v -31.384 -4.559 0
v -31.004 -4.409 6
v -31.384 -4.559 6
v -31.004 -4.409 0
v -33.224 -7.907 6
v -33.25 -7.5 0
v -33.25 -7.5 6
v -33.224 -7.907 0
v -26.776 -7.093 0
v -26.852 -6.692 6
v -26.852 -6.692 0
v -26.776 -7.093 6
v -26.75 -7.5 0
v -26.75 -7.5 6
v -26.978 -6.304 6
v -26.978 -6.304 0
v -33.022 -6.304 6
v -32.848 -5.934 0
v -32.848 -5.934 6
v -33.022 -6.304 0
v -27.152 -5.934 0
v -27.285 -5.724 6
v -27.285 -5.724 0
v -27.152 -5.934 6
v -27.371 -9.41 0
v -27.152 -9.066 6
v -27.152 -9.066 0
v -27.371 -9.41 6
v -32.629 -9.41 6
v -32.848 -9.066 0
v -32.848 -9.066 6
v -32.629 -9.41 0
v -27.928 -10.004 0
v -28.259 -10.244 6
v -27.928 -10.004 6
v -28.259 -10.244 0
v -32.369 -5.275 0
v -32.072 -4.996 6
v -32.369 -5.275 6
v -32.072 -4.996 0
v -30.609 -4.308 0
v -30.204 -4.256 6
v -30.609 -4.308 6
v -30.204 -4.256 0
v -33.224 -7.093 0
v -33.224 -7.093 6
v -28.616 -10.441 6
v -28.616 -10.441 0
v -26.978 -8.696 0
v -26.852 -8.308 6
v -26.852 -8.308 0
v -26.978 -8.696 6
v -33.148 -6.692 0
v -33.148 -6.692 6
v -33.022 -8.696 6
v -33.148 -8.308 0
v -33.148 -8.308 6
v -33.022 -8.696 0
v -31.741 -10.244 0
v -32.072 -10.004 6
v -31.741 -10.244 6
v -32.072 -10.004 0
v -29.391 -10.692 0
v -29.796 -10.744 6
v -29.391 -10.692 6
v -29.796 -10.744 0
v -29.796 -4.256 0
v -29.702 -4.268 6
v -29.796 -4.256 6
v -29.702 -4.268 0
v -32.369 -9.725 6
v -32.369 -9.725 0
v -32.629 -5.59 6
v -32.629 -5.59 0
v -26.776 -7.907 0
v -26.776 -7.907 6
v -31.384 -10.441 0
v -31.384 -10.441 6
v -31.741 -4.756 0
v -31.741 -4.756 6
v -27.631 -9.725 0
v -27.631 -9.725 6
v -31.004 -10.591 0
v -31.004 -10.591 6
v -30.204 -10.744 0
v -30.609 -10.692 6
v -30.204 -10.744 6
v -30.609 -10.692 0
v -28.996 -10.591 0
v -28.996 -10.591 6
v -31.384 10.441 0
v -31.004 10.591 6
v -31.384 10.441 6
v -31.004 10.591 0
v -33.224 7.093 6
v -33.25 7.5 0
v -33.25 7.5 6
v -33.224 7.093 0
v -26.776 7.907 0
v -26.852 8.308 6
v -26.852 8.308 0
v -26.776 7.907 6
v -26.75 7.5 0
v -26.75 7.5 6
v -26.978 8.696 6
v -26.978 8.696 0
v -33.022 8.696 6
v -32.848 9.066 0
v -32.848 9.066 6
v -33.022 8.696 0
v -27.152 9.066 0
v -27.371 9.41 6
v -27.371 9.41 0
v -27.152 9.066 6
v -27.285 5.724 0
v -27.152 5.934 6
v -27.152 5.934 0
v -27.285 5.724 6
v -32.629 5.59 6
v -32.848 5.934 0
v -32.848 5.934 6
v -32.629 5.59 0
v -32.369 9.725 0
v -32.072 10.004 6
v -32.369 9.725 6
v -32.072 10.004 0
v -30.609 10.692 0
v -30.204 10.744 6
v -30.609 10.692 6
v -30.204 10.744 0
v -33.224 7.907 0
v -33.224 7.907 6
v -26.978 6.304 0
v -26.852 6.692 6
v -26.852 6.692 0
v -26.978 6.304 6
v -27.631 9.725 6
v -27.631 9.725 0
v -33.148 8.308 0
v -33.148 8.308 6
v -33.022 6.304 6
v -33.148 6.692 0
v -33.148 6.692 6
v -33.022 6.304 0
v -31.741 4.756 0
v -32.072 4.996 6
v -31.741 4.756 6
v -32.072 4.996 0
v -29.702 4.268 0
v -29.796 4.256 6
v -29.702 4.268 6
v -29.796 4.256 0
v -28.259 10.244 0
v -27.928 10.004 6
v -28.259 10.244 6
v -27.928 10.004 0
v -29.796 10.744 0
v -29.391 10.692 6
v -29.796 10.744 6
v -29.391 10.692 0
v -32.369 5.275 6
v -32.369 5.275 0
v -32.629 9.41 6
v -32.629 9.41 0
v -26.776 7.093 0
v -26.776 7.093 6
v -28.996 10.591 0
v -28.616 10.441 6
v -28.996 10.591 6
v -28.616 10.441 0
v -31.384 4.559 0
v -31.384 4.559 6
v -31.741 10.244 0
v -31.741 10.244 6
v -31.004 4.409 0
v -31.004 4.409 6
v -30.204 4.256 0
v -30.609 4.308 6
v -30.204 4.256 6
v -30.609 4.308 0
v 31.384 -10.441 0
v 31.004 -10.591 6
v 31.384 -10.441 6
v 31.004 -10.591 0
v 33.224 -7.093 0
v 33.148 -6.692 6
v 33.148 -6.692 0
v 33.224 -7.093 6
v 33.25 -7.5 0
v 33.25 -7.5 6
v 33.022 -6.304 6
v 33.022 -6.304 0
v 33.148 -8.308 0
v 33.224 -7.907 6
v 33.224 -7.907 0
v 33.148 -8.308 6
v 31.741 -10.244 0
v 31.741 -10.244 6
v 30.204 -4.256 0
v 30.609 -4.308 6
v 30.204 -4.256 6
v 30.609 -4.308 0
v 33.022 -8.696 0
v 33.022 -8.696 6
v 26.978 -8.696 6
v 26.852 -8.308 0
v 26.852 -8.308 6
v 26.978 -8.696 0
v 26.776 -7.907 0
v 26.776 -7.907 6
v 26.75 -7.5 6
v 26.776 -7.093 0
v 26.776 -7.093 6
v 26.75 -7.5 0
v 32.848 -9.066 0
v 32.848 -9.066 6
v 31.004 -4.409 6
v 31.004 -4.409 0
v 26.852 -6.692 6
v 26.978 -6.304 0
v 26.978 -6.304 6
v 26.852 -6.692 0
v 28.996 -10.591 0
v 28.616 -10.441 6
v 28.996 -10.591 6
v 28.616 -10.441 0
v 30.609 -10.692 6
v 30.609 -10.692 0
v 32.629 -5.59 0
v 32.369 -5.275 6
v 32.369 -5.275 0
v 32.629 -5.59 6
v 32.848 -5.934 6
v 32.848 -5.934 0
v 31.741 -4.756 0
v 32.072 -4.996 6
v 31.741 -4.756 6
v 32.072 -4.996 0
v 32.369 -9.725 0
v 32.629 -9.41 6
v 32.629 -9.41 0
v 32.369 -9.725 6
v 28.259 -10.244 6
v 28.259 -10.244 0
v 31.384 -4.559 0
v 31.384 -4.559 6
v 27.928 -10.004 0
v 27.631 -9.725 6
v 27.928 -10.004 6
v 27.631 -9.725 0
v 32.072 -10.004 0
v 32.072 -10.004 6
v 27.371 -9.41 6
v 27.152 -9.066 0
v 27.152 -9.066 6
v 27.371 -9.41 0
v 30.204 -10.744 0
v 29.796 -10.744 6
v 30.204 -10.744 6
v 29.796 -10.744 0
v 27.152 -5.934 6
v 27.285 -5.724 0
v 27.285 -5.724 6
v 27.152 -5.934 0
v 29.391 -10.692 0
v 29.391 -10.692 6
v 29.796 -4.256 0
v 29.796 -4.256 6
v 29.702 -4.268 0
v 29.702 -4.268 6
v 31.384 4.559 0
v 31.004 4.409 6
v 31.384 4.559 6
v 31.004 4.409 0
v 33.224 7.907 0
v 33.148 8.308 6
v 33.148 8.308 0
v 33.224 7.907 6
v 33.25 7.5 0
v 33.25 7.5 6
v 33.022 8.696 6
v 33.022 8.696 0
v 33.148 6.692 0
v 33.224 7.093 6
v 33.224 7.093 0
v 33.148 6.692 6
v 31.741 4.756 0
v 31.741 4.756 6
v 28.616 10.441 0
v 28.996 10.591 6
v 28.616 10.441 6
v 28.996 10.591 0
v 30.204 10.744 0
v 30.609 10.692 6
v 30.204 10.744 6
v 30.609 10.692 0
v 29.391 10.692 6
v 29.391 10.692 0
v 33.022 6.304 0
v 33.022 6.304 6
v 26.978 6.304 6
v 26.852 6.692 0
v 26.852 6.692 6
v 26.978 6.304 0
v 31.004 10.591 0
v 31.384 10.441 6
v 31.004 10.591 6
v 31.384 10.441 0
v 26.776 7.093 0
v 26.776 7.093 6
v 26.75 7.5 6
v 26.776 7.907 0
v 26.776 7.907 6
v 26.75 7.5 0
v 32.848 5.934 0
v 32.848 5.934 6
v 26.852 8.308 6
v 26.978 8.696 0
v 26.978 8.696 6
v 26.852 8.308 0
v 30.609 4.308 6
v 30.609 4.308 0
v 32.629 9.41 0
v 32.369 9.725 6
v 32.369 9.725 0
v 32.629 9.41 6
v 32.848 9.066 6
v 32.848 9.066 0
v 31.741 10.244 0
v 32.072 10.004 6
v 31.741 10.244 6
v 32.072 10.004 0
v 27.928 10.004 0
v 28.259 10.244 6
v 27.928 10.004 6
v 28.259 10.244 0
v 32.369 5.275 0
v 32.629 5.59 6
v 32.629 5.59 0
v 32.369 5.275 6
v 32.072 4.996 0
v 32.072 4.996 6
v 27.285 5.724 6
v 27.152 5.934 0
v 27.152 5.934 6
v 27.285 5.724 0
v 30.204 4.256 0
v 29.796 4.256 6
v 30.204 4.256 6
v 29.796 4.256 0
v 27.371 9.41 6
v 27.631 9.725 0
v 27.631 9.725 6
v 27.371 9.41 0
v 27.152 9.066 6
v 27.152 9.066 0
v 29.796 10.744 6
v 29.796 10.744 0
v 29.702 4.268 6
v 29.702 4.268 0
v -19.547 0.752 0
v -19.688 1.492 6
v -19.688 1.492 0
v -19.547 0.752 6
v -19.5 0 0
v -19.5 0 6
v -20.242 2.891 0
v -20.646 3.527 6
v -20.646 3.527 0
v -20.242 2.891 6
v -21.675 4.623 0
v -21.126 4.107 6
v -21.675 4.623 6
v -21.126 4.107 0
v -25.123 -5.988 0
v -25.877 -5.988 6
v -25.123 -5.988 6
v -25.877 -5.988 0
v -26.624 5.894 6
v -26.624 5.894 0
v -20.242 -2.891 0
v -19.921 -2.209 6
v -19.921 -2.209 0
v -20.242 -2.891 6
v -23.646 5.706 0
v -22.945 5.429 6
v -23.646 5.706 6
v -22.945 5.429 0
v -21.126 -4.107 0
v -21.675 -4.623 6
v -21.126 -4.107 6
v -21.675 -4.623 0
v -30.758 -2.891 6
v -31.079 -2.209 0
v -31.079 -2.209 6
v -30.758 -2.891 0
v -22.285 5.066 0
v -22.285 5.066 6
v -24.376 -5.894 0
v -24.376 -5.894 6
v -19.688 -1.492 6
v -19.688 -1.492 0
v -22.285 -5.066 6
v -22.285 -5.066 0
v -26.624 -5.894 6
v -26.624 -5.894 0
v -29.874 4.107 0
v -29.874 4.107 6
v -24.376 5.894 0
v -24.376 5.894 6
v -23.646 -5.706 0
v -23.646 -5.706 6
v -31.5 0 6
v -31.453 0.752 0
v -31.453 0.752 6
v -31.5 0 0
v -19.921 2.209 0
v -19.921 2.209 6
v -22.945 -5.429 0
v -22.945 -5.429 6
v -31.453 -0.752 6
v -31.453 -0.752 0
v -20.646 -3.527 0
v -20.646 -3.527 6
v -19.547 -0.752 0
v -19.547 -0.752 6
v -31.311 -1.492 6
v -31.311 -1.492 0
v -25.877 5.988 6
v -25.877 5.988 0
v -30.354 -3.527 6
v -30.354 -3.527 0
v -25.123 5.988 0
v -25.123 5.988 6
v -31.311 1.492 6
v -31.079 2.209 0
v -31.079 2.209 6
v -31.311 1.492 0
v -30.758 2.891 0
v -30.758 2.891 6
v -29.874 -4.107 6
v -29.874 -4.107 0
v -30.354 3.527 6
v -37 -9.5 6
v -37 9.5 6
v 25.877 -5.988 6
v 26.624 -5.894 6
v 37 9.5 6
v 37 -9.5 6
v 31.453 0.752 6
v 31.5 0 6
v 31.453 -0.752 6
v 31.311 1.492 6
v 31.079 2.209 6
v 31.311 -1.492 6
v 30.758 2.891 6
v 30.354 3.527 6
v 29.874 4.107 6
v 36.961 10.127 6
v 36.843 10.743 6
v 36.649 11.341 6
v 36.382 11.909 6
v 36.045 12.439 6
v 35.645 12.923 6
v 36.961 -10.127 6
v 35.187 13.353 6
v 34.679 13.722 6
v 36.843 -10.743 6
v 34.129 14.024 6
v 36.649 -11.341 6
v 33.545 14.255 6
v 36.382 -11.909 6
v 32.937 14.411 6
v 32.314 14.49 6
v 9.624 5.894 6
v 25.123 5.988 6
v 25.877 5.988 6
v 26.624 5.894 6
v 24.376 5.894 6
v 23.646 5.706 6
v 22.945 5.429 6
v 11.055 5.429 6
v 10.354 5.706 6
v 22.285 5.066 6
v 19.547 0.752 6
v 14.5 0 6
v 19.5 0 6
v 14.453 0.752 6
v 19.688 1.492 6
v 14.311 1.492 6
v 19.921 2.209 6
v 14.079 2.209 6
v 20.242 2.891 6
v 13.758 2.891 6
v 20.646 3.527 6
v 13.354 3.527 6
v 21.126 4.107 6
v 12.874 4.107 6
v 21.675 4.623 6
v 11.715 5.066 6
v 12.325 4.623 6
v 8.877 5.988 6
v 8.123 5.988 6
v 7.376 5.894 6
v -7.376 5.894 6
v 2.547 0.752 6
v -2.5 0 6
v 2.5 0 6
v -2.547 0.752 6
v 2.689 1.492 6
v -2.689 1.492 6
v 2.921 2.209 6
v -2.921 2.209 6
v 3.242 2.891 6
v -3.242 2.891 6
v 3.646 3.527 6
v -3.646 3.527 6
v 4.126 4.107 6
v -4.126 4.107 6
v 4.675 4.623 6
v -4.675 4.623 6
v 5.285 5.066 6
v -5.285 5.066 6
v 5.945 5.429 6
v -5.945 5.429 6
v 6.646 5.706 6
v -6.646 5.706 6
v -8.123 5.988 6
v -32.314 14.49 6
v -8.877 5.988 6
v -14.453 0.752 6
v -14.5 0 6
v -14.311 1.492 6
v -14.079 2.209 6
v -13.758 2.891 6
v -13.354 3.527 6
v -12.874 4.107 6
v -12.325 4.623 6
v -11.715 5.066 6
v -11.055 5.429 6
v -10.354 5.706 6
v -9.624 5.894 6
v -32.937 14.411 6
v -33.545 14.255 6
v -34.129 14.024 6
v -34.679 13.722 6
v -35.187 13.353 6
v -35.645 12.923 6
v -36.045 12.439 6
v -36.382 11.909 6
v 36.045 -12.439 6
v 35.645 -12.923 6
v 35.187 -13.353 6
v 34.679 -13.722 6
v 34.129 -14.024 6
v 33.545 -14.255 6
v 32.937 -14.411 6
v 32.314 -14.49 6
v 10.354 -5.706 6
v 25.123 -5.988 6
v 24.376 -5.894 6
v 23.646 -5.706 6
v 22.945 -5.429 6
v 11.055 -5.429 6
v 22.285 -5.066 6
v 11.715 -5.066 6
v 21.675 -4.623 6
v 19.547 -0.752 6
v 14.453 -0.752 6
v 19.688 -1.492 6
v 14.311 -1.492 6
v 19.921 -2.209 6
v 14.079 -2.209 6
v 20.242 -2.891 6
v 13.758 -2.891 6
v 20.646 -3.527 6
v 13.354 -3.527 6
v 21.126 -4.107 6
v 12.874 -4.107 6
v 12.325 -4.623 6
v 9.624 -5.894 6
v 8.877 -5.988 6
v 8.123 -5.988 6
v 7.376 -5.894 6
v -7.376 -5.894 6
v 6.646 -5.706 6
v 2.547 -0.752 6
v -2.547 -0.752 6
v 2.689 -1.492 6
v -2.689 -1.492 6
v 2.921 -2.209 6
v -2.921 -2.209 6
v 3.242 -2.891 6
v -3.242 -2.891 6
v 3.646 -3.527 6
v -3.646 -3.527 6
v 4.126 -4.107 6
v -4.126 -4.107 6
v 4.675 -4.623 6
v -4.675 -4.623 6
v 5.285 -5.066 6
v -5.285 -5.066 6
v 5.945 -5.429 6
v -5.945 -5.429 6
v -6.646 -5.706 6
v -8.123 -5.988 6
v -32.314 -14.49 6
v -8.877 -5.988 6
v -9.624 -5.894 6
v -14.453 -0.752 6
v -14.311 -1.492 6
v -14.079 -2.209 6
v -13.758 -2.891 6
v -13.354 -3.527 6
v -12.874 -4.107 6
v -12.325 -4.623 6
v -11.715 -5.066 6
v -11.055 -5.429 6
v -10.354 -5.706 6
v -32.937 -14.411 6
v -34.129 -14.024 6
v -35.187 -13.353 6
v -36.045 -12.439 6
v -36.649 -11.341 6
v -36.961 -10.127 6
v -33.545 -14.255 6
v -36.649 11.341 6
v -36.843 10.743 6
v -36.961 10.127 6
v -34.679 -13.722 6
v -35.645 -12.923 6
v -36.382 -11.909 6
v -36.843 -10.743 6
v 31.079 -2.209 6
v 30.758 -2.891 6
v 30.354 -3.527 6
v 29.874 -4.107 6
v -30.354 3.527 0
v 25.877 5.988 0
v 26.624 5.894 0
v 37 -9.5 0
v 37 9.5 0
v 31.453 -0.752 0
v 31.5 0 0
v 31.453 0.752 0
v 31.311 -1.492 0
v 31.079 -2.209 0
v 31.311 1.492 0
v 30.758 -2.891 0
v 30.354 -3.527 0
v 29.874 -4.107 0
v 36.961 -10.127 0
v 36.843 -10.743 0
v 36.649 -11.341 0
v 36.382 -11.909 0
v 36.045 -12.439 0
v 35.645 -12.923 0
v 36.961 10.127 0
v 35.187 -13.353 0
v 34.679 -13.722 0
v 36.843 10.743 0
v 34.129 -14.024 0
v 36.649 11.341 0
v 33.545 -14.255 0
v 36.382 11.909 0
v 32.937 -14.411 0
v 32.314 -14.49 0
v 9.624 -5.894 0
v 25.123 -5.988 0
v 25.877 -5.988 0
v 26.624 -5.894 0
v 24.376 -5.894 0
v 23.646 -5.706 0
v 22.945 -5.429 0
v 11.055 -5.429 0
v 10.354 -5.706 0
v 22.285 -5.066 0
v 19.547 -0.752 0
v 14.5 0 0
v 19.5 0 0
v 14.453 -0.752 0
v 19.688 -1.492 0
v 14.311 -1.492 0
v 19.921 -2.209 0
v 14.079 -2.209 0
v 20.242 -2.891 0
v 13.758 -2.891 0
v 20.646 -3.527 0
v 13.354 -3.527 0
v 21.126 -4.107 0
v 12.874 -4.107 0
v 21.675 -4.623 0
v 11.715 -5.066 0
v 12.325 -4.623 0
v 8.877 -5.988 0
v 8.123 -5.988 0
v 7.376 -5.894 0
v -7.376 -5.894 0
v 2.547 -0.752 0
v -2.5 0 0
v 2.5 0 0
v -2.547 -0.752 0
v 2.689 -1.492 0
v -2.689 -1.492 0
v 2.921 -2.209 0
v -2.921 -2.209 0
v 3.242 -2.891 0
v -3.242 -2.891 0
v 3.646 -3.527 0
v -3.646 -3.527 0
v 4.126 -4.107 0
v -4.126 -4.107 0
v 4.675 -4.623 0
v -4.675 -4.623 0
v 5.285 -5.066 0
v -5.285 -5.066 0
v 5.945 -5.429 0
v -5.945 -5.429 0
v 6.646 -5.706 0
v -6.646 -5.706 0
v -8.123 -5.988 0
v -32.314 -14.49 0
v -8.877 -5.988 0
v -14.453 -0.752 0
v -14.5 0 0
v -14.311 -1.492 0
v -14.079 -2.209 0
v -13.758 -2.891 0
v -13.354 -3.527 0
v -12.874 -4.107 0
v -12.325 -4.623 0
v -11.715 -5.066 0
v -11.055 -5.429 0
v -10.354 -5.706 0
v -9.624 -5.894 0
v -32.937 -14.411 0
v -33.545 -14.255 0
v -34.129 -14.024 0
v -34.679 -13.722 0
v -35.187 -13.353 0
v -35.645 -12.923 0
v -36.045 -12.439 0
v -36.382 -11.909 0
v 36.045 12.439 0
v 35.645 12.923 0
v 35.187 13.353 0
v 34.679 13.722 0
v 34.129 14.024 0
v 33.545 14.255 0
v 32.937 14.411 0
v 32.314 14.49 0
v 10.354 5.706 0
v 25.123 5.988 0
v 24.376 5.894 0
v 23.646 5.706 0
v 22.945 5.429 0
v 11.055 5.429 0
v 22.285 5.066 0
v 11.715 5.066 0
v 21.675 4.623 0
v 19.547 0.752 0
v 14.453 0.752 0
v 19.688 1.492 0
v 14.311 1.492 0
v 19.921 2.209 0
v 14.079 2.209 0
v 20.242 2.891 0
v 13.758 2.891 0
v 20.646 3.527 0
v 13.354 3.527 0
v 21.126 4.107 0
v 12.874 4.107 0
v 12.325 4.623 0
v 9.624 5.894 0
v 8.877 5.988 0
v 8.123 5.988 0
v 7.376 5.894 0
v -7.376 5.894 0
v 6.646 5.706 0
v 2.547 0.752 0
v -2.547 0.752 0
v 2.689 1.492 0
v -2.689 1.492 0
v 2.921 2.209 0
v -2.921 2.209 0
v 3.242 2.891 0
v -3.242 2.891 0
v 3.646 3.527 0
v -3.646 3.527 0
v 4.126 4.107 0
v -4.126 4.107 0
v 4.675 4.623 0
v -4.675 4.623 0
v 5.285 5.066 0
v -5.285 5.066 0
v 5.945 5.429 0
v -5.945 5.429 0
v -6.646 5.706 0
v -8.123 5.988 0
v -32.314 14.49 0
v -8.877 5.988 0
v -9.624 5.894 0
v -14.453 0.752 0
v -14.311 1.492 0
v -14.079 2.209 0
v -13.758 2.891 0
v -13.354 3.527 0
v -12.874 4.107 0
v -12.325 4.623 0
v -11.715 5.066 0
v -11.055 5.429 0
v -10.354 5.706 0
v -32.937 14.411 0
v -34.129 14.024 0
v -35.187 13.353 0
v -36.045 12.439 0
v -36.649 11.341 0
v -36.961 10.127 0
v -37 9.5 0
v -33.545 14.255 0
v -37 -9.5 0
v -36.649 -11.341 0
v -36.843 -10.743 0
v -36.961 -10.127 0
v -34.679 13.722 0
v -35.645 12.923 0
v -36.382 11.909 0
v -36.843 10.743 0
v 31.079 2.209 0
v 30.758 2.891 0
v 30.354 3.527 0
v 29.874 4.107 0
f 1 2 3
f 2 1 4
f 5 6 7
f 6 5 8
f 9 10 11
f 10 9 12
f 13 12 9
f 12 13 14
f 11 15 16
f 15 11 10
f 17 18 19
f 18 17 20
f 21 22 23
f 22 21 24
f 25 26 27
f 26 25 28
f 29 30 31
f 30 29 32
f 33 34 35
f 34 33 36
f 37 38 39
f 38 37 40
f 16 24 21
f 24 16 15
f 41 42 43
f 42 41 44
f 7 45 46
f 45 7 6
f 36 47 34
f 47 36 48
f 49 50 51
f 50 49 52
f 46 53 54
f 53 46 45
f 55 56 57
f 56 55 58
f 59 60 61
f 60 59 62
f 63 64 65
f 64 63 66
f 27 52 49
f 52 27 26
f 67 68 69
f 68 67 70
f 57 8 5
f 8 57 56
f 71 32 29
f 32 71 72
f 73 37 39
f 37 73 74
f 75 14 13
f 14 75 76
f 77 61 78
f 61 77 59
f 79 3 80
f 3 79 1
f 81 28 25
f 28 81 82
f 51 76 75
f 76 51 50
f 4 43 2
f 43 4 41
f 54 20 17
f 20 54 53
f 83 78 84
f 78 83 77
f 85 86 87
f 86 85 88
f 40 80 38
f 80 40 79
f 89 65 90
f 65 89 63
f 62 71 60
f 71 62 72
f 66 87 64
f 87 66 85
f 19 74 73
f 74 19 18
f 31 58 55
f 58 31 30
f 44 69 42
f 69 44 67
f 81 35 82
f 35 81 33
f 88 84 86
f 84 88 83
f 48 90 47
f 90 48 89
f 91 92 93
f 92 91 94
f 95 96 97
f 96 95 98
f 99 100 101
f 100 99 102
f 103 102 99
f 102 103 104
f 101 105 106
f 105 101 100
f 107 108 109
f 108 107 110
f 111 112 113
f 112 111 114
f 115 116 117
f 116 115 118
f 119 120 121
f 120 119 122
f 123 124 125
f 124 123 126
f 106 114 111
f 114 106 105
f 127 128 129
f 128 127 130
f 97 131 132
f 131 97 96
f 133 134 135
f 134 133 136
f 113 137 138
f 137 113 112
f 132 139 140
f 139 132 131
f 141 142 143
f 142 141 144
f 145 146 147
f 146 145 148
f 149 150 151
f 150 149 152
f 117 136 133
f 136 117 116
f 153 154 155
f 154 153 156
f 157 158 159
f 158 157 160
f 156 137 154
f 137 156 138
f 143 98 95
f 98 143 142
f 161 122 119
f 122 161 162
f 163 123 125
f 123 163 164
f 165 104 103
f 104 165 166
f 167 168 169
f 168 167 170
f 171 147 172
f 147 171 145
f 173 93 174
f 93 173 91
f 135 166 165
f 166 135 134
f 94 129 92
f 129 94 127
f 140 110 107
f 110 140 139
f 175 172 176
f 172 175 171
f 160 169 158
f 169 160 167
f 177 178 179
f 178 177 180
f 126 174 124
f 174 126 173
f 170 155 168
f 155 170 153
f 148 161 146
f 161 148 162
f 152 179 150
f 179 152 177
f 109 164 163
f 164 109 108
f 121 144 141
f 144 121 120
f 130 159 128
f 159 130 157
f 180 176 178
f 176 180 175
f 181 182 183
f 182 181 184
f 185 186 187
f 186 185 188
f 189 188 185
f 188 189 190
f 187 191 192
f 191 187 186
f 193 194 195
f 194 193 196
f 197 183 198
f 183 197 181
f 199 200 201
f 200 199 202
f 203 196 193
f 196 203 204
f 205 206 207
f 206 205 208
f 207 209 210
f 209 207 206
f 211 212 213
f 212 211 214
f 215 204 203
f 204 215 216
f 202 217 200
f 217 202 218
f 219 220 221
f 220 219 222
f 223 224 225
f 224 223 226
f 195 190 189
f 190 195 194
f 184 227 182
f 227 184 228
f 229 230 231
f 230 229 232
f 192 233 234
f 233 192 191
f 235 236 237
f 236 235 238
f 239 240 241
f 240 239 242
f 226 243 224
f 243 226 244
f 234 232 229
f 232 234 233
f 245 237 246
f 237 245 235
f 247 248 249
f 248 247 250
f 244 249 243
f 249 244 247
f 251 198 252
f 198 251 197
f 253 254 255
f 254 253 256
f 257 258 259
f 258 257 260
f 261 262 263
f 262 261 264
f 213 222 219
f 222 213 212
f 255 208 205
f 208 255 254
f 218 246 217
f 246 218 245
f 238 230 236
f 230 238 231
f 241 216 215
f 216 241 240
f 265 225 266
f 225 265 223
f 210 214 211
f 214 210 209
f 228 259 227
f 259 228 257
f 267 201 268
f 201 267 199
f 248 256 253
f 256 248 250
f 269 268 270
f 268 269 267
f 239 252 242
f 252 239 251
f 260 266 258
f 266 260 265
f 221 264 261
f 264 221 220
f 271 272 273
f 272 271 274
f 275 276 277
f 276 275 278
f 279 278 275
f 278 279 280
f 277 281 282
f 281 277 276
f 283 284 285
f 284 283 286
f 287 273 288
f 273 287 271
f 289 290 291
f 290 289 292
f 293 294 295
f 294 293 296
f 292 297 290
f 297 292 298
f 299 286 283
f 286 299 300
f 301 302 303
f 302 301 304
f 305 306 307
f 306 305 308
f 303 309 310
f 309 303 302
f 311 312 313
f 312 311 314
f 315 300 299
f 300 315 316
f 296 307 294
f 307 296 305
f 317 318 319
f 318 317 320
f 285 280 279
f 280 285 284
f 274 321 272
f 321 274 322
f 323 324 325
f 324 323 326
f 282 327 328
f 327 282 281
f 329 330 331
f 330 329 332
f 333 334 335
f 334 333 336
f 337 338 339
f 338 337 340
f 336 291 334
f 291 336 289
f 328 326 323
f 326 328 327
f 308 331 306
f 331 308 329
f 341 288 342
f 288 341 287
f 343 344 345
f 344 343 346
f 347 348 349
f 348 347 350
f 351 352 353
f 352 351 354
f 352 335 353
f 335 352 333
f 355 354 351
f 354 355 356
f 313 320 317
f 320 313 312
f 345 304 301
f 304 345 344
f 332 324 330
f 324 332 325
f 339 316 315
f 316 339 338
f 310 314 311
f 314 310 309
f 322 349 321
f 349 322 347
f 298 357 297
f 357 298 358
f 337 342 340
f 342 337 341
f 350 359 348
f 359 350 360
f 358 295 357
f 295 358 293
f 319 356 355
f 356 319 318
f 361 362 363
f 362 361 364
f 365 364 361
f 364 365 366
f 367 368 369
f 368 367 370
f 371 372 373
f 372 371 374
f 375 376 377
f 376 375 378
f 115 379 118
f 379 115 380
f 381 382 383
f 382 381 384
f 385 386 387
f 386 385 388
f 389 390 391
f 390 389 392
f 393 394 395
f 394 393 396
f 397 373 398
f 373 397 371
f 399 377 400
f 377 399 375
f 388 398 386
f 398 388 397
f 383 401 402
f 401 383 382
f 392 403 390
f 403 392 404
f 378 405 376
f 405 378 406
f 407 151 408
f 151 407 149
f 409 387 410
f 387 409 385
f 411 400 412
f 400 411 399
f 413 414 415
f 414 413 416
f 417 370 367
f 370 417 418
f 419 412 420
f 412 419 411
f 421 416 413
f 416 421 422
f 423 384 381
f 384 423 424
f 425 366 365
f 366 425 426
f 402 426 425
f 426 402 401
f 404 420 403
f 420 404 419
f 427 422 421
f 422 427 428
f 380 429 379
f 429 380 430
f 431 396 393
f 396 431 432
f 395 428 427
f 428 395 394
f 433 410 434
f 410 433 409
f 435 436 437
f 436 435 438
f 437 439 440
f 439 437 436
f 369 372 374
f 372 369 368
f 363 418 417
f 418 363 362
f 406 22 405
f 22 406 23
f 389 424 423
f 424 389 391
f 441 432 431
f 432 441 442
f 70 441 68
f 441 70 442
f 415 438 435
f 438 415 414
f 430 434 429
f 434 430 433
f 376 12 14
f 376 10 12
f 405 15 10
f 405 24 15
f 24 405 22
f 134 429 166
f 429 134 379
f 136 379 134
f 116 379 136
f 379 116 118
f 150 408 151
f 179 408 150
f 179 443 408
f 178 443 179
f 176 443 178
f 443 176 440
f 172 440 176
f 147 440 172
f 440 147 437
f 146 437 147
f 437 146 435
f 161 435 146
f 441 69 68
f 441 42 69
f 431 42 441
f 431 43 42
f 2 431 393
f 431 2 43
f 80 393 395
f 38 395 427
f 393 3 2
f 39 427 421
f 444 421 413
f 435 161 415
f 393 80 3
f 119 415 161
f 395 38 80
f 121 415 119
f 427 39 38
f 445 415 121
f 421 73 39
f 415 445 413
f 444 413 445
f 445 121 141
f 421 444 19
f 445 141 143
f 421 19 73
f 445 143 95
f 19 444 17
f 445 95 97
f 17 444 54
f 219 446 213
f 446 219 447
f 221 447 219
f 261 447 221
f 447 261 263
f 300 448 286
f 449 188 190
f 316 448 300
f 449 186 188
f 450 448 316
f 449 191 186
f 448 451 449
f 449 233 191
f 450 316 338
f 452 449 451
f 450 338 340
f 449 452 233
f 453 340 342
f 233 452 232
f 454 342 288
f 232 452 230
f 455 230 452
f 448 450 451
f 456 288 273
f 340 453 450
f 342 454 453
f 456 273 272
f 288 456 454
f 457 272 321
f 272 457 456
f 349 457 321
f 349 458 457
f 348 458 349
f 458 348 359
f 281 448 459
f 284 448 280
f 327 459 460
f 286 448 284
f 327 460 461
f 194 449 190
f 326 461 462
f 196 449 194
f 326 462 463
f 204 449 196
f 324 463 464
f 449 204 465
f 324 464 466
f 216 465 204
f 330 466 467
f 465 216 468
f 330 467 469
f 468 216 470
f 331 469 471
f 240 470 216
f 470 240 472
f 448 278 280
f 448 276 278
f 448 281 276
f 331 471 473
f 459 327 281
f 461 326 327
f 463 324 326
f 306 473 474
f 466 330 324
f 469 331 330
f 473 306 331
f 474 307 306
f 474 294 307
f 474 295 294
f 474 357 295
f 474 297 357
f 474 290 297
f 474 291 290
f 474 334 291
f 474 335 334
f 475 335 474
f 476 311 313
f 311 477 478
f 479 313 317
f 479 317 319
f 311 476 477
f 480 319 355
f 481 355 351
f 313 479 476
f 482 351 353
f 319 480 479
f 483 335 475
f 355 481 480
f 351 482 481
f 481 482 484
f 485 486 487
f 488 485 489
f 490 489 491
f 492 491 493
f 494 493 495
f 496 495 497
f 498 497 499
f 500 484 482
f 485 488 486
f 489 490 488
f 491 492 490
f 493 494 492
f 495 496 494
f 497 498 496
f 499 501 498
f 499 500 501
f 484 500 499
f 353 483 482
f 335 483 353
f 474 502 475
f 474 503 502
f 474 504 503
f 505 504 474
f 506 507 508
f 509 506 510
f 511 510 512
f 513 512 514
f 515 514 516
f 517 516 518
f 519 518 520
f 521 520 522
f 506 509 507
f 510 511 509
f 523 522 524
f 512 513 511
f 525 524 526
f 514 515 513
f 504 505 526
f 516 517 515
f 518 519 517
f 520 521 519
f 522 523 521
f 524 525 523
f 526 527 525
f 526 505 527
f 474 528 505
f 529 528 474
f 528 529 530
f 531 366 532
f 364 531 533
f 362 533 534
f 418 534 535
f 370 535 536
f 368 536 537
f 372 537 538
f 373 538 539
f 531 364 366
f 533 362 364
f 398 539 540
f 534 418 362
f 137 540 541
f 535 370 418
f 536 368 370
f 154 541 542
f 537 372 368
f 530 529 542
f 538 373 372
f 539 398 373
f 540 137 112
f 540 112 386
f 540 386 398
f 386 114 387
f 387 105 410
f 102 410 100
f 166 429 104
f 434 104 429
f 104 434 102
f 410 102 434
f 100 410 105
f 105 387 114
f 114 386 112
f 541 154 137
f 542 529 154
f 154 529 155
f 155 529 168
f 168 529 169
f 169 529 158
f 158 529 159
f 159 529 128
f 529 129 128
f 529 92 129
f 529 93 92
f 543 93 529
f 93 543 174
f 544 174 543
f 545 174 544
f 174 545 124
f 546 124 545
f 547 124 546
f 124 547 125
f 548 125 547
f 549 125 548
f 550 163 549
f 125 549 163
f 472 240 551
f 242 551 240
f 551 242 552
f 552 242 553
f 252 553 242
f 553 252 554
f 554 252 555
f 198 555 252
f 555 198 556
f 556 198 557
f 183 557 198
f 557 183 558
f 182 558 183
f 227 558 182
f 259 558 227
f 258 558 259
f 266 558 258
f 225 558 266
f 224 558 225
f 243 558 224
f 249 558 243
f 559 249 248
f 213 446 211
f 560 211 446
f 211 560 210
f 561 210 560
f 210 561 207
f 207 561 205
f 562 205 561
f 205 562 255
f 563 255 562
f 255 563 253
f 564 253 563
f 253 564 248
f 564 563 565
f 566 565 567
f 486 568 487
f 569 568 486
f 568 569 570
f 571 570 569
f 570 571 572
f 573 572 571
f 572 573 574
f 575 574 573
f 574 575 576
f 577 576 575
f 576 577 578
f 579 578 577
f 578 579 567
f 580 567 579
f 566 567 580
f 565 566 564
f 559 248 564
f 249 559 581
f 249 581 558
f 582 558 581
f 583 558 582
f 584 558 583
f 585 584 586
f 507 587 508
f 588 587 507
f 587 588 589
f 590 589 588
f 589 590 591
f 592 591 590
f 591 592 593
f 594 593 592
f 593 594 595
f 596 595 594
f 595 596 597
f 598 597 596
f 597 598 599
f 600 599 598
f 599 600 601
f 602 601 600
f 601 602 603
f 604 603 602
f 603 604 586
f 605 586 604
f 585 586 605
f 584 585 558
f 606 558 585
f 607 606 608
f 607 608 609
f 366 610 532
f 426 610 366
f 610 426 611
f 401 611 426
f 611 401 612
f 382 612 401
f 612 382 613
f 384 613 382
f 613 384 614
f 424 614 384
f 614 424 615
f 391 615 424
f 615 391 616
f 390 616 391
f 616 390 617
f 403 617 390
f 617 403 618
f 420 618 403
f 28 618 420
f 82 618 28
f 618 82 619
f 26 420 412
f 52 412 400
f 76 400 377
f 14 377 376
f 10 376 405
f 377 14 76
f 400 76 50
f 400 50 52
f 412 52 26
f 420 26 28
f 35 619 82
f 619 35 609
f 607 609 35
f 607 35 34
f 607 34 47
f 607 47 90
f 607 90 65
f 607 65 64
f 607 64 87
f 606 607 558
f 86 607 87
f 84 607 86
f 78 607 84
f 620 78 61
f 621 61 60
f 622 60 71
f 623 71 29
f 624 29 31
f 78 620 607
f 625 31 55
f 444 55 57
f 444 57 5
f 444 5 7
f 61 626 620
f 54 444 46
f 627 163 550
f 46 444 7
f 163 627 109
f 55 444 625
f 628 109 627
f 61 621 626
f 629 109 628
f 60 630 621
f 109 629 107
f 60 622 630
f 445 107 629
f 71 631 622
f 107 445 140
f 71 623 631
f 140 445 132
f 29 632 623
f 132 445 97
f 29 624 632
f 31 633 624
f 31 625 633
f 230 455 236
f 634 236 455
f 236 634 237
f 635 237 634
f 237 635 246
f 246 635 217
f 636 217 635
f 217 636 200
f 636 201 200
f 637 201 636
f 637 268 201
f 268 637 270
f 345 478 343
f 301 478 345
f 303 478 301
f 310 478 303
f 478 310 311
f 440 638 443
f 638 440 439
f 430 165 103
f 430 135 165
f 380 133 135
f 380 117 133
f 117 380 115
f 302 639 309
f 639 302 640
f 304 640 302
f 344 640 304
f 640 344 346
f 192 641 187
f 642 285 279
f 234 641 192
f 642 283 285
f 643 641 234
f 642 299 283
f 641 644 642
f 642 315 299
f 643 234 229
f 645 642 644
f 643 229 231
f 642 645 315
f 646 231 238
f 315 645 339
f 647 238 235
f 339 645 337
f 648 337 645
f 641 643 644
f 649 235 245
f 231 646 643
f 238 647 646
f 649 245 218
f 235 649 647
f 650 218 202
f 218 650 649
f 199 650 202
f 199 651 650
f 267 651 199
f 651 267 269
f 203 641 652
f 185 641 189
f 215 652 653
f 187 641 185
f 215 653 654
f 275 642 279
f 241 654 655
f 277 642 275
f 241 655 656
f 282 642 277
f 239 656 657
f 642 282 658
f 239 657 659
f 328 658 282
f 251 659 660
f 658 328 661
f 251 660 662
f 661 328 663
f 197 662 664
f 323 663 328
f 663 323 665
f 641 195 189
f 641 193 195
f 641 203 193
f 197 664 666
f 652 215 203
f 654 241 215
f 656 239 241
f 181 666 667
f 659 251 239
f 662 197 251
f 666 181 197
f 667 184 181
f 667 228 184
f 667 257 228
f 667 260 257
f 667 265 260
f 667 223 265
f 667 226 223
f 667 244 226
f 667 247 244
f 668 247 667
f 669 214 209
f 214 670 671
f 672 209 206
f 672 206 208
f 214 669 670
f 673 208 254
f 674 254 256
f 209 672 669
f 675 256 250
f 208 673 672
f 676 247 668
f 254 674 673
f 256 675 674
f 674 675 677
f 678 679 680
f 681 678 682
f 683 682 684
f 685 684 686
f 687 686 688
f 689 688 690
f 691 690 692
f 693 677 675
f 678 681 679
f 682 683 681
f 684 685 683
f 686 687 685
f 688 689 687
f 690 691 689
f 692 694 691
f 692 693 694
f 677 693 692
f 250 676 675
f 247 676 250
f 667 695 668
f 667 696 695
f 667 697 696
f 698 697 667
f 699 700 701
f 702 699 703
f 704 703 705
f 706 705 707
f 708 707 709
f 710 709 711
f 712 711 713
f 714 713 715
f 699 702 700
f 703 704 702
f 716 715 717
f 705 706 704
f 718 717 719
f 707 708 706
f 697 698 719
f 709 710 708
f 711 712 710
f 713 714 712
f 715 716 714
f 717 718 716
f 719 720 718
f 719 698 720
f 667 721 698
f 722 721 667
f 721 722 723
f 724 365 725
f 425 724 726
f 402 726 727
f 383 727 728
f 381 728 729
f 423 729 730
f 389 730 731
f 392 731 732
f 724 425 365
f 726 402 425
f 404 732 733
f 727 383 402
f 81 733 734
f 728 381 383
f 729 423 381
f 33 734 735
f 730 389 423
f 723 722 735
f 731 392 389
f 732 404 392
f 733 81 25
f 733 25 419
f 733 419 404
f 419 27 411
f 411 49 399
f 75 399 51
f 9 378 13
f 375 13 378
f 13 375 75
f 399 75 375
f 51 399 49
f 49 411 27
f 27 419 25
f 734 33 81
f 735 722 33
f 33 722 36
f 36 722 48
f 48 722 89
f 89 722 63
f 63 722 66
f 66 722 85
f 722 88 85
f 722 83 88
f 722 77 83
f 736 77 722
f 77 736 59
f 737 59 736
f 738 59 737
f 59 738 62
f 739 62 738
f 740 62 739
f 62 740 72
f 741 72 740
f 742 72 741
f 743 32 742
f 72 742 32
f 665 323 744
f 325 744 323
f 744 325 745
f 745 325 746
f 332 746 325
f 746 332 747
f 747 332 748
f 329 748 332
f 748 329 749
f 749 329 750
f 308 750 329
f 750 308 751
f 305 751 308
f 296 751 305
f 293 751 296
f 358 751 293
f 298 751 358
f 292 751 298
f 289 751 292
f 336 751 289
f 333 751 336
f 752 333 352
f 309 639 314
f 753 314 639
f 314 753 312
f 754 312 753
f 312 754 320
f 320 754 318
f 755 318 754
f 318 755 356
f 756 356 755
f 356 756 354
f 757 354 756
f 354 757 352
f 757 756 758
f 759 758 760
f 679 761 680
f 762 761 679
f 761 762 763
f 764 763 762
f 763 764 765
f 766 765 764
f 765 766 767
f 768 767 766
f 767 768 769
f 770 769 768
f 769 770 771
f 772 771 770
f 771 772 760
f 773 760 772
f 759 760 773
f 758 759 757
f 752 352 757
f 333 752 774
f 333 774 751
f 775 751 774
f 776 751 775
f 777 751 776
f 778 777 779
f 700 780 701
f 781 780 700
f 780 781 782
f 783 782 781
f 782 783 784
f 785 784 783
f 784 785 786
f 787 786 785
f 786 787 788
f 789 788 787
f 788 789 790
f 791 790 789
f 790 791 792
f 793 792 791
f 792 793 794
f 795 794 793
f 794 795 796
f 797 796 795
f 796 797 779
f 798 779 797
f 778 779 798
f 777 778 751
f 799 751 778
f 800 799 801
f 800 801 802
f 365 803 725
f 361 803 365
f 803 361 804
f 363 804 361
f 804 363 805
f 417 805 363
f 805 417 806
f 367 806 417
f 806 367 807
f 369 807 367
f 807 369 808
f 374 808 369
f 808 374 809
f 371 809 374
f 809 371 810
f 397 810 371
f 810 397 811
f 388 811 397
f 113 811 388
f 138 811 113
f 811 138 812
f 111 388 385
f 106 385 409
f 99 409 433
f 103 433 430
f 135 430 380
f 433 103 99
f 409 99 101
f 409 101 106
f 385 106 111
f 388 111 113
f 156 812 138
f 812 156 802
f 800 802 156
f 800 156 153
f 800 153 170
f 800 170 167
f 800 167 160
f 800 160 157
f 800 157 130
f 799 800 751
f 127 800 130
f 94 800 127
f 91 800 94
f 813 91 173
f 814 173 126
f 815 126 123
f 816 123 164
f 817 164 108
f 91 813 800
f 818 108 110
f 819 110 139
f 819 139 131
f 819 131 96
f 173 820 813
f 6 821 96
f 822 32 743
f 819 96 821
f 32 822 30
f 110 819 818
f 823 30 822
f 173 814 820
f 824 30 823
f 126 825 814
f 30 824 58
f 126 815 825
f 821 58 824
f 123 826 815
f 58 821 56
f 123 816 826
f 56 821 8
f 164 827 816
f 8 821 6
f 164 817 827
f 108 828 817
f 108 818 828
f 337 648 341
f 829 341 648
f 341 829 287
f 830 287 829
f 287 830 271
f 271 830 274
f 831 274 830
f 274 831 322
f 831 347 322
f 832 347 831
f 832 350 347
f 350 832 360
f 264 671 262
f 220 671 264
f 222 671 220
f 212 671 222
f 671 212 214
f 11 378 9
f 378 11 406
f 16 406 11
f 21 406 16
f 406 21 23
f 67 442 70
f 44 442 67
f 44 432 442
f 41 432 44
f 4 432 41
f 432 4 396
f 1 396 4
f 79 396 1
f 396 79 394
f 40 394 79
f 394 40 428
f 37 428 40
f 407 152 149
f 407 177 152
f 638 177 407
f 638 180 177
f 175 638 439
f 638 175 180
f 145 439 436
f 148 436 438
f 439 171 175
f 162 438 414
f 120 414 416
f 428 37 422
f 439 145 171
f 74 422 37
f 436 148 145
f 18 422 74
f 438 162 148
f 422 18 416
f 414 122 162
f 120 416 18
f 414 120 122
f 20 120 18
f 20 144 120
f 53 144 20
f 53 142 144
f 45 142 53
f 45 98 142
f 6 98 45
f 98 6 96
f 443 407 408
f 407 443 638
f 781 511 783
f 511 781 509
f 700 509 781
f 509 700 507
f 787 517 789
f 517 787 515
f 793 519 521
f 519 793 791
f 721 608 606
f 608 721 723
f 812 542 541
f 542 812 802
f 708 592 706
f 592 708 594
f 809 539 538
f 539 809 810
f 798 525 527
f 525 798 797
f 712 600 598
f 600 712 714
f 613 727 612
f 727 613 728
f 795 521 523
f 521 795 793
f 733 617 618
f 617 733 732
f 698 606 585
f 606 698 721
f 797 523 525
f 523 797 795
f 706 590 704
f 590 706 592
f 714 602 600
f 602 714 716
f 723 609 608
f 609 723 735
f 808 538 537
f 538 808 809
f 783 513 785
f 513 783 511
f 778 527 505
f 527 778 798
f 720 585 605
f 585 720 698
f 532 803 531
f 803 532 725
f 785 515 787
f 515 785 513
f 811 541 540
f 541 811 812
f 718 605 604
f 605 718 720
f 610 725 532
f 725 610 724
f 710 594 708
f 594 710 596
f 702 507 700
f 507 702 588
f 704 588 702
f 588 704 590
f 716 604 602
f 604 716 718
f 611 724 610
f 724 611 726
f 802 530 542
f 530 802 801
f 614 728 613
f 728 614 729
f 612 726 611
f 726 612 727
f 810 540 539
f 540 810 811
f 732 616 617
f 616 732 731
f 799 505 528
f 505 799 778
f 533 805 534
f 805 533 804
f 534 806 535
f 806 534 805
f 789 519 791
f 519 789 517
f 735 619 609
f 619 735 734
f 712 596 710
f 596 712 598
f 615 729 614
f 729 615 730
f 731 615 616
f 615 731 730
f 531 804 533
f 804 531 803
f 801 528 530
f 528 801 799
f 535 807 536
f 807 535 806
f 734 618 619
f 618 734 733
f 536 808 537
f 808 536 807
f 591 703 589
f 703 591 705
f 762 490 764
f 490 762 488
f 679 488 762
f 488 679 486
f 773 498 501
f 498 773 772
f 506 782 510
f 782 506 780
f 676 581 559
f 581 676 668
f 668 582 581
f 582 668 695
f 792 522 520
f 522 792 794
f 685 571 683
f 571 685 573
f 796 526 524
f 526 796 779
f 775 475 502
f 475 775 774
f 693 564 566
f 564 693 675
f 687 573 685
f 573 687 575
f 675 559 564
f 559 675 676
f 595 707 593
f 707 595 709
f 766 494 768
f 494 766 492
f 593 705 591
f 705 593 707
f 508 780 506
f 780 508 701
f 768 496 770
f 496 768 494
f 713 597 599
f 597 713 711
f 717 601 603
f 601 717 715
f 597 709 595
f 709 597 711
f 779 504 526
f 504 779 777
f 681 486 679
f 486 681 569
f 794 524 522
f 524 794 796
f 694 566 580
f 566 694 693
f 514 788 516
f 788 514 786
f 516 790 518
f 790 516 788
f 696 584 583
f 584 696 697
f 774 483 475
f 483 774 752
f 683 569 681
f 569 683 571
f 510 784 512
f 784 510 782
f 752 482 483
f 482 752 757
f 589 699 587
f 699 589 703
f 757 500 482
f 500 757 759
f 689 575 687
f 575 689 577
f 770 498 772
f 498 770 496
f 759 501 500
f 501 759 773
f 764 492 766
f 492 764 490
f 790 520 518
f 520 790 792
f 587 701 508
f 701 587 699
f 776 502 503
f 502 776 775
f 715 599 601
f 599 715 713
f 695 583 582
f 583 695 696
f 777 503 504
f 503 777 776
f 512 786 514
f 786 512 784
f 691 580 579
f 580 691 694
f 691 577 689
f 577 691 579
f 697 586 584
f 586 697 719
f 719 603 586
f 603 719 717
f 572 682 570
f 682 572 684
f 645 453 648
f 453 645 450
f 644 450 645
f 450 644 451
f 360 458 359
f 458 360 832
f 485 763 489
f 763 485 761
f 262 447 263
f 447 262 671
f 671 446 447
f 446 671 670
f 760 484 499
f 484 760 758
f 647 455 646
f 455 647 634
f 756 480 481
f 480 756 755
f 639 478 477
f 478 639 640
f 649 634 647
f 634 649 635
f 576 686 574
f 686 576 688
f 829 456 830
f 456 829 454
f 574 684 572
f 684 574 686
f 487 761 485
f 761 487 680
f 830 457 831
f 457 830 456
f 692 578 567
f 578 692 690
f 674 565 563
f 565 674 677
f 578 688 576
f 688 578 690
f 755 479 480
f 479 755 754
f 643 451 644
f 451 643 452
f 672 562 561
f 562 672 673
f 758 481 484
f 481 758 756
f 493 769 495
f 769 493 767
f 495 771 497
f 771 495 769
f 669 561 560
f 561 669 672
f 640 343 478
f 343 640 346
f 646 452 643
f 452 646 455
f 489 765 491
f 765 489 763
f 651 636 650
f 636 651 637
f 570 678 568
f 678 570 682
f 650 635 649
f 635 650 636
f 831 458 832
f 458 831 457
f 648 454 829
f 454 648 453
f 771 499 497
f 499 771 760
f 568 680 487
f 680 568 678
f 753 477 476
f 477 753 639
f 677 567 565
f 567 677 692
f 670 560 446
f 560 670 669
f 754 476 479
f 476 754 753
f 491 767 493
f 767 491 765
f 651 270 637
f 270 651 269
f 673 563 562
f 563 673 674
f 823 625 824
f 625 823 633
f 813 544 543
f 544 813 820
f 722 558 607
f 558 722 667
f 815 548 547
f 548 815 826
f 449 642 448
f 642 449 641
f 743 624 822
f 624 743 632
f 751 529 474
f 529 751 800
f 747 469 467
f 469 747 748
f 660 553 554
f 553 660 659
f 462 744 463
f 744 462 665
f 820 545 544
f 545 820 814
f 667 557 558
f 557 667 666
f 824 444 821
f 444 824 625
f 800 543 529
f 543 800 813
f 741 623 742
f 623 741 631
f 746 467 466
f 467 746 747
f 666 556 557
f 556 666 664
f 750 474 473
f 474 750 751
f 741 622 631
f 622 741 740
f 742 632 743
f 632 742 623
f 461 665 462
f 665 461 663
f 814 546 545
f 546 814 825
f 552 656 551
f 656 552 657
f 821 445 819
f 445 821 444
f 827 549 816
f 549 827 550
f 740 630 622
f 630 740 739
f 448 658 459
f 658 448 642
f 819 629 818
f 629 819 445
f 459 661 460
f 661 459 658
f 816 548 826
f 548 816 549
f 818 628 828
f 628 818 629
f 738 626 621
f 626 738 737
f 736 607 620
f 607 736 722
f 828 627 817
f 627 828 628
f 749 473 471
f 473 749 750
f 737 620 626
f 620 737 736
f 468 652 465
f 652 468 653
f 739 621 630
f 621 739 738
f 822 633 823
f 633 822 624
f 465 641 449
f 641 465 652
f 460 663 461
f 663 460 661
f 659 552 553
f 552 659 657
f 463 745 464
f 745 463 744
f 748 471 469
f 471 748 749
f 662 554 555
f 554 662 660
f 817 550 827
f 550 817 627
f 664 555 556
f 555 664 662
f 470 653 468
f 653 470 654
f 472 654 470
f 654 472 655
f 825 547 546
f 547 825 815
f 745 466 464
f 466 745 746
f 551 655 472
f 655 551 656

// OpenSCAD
$fn = 50;


difference() {
	union() {
		hull() {
			translate(v = [-32.0000000000, 9.5000000000, 0]) {
				cylinder(h = 6, r = 5);
			}
			translate(v = [32.0000000000, 9.5000000000, 0]) {
				cylinder(h = 6, r = 5);
			}
			translate(v = [-32.0000000000, -9.5000000000, 0]) {
				cylinder(h = 6, r = 5);
			}
			translate(v = [32.0000000000, -9.5000000000, 0]) {
				cylinder(h = 6, r = 5);
			}
		}
	}
	union() {
		#translate(v = [-30.0000000000, -7.5000000000, -100.0000000000]) {
			cylinder(h = 200, r = 3.2500000000);
		}
		#translate(v = [-30.0000000000, 7.5000000000, -100.0000000000]) {
			cylinder(h = 200, r = 3.2500000000);
		}
		#translate(v = [30.0000000000, -7.5000000000, -100.0000000000]) {
			cylinder(h = 200, r = 3.2500000000);
		}
		#translate(v = [30.0000000000, 7.5000000000, -100.0000000000]) {
			cylinder(h = 200, r = 3.2500000000);
		}
		#translate(v = [-25.5000000000, 0, 0]) {
			cylinder(h = 6, r = 6.0000000000);
		}
		#translate(v = [-8.5000000000, 0, 0]) {
			cylinder(h = 6, r = 6.0000000000);
		}
		#translate(v = [8.5000000000, 0, 0]) {
			cylinder(h = 6, r = 6.0000000000);
		}
		#translate(v = [25.5000000000, 0, 0]) {
			cylinder(h = 6, r = 6.0000000000);
		}
	}
}
